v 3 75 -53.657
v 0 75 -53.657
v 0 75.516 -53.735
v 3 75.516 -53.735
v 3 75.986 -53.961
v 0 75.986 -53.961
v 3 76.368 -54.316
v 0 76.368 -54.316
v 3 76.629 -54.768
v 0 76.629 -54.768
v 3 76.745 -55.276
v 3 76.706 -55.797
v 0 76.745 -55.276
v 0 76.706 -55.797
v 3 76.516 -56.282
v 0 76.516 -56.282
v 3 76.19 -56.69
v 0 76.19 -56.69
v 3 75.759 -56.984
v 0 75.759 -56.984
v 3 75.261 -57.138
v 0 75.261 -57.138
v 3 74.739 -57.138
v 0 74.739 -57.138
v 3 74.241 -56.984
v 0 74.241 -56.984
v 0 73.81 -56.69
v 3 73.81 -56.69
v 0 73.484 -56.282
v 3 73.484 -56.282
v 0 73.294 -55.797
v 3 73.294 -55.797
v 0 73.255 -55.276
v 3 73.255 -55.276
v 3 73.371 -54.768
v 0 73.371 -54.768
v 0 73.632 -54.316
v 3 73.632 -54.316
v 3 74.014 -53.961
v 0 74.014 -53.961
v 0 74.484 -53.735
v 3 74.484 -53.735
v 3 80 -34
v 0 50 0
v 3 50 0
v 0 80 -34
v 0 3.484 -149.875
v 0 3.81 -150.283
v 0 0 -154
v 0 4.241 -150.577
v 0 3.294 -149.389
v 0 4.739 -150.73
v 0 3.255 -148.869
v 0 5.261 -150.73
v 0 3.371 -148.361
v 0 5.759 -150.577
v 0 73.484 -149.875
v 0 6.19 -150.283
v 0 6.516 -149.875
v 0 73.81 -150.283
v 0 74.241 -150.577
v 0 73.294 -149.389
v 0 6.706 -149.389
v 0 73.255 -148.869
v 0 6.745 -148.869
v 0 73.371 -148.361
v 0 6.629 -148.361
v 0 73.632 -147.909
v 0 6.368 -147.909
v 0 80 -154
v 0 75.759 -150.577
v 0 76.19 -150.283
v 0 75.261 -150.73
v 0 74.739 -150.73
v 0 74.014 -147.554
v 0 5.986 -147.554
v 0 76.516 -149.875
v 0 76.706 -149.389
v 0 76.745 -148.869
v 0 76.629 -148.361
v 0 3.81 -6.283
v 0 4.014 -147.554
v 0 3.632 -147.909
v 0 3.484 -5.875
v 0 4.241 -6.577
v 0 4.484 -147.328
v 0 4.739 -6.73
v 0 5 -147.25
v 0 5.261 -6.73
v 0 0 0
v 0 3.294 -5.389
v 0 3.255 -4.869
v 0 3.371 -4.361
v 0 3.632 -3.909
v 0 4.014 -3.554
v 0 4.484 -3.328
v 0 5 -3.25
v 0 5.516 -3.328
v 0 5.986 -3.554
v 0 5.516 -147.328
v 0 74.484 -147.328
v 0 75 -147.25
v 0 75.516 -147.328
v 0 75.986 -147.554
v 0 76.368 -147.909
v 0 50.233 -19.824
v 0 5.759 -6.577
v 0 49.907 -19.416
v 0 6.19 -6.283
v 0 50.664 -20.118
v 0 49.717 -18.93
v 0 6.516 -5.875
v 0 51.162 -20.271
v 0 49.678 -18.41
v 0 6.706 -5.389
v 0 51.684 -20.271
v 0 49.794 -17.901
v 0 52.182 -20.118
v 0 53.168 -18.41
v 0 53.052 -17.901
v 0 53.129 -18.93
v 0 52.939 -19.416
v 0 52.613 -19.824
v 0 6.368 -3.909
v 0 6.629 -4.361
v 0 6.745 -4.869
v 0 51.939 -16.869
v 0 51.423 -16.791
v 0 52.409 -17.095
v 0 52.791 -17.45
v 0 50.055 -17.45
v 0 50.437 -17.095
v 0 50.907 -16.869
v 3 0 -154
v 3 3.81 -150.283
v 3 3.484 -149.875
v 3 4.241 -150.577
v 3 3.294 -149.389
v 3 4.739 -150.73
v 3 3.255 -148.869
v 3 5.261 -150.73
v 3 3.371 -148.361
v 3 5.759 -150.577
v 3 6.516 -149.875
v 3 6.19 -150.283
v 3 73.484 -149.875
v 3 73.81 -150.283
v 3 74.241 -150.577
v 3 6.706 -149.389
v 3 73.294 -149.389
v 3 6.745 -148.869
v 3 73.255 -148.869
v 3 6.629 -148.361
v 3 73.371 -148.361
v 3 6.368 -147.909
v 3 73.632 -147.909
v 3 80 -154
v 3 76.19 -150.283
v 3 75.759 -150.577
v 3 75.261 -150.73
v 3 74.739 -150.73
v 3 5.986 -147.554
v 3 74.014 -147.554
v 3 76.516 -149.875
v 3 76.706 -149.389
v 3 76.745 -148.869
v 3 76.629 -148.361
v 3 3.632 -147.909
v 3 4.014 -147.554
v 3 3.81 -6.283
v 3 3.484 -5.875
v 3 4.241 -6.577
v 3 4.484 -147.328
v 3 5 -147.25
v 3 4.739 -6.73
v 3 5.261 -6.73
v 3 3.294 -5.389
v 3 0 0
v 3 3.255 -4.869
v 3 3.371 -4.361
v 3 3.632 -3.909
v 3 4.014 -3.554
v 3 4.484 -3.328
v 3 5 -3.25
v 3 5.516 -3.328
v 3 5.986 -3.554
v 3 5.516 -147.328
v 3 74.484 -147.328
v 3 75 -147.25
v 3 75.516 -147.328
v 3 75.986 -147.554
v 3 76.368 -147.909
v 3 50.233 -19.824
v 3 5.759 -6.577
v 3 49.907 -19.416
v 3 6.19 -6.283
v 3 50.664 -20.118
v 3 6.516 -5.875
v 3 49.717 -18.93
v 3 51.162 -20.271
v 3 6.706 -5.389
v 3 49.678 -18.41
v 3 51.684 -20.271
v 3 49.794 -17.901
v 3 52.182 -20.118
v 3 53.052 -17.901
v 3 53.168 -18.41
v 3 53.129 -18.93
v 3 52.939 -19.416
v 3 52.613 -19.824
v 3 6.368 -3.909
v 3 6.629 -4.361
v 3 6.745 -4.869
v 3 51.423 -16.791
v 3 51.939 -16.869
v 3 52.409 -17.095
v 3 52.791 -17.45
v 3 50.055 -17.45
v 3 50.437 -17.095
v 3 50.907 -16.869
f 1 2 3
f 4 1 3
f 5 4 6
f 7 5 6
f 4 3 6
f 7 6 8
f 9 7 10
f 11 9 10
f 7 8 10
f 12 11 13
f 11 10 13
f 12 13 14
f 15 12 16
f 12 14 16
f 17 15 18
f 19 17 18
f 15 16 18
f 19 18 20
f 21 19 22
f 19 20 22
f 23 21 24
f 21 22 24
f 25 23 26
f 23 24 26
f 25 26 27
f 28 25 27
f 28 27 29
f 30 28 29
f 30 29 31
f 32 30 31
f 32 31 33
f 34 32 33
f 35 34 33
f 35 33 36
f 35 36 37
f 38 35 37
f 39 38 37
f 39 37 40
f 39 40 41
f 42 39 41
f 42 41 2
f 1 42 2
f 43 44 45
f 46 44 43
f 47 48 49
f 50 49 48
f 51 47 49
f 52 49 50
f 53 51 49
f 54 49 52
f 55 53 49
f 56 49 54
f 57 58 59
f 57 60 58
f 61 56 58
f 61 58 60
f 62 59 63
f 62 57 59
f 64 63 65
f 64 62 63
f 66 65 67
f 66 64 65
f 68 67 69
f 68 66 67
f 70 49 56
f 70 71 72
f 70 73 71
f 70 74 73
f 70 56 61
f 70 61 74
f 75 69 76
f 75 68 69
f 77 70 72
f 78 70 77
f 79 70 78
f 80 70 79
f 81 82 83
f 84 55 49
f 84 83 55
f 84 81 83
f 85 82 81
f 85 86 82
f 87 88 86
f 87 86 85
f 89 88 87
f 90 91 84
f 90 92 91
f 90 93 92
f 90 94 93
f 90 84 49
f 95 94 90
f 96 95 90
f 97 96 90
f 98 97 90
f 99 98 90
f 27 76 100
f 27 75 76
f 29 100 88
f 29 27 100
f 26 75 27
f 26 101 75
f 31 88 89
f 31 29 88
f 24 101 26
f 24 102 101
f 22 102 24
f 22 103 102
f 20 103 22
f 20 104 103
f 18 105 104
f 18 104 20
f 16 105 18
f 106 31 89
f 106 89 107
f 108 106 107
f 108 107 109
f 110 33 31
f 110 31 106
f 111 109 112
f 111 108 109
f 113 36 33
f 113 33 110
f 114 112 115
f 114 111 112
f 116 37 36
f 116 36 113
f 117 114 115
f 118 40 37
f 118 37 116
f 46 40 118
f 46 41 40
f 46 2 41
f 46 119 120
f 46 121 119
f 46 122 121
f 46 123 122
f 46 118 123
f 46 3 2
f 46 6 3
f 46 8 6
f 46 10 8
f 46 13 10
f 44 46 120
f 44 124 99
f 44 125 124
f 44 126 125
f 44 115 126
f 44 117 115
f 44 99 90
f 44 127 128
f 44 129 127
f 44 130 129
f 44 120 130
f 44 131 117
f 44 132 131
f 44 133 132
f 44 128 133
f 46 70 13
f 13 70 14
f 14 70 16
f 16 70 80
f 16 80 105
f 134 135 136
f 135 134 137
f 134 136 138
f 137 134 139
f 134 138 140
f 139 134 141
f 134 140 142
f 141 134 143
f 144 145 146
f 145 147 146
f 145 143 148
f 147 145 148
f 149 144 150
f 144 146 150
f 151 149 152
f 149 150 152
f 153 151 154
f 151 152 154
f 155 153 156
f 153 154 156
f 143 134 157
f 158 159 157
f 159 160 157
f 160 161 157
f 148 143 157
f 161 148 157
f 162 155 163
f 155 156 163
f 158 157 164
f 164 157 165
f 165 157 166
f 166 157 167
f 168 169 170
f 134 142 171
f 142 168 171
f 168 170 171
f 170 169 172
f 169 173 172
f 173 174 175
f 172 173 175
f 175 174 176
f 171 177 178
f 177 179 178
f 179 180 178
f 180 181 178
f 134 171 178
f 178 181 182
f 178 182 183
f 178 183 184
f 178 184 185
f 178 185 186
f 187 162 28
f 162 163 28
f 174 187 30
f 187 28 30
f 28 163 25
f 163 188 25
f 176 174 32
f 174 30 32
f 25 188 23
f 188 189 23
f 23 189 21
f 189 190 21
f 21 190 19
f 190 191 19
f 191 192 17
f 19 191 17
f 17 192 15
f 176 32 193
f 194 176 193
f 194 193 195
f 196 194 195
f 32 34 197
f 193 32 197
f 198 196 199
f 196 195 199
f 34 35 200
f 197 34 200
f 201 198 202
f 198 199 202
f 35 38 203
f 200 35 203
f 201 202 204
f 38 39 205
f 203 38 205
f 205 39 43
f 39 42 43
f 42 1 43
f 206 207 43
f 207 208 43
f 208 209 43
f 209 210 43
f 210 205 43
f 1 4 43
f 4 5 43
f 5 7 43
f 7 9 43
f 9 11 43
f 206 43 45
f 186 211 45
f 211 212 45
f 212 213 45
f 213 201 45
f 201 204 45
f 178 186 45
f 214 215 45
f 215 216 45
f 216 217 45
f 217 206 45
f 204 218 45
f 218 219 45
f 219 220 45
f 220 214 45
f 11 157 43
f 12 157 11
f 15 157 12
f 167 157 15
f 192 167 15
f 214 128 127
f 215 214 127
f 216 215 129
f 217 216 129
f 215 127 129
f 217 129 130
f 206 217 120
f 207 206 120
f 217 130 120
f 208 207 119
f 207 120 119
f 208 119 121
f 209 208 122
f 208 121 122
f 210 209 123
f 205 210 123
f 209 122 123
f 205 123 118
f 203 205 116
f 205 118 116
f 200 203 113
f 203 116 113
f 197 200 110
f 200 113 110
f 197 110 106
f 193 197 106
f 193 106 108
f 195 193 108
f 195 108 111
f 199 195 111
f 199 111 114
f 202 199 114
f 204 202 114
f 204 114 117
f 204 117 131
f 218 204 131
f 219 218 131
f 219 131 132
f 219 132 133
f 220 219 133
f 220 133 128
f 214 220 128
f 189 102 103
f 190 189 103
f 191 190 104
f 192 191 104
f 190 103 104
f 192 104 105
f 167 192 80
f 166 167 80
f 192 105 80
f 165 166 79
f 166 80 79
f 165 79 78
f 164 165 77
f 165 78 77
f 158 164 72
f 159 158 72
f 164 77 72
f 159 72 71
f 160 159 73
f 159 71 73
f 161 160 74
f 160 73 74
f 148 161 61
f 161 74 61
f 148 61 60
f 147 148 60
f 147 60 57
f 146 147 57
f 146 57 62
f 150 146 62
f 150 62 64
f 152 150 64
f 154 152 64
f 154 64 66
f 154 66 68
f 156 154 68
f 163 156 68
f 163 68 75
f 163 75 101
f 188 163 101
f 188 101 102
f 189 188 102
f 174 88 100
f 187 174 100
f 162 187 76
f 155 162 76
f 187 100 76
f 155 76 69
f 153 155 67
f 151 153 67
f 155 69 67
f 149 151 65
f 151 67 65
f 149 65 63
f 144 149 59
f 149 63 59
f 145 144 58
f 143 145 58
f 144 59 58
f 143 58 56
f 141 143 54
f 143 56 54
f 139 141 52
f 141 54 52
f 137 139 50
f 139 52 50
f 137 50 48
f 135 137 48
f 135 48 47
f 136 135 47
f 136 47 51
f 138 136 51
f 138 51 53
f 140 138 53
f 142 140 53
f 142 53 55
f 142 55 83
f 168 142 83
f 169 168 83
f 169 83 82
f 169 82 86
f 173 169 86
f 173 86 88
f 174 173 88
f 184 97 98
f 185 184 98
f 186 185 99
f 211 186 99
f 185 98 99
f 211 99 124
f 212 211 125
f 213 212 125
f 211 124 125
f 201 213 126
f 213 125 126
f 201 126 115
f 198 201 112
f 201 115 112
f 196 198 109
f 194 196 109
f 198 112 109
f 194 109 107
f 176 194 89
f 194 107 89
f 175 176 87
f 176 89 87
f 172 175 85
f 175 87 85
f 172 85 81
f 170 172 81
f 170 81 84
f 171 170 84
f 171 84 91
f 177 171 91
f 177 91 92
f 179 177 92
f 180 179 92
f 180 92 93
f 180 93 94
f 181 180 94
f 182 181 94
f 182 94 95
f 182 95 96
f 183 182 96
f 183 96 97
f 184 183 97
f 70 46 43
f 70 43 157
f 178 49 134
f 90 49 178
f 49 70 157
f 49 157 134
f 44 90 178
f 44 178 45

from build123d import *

# Parameters (mm, degrees)
BOSS_EXTRUDE1_DEPTH = 3
SKETCH2_R           = 1.75
CUT_EXTRUDE1_DEPTH  = 4


with BuildPart() as part:
    # Sketch1 → Boss-Extrude1 (new body)
    with BuildSketch(Plane(origin=(0, 0, 0), x_dir=(0, 0, -1), z_dir=(1, 0, 0))):
        Polygon((0, 0), (0, 50), (34, 80), (154, 80), (154, 0), align=None)
    extrude(amount=BOSS_EXTRUDE1_DEPTH)

    # Sketch2 → Cut-Extrude1 (cut, through all)
    with BuildSketch(Plane.ZY):
        with Locations((-149, 5)):
            Circle(SKETCH2_R)
        with Locations((-149, 75)):
            Circle(SKETCH2_R)
        with Locations((-5, 5)):
            Circle(SKETCH2_R)
        with Locations((-55.407189005, 75)):
            Circle(SKETCH2_R)
        with Locations((-18.540830268, 51.422993608)):
            Circle(SKETCH2_R)
    extrude(amount=-CUT_EXTRUDE1_DEPTH, mode=Mode.SUBTRACT)


solid = part.part
